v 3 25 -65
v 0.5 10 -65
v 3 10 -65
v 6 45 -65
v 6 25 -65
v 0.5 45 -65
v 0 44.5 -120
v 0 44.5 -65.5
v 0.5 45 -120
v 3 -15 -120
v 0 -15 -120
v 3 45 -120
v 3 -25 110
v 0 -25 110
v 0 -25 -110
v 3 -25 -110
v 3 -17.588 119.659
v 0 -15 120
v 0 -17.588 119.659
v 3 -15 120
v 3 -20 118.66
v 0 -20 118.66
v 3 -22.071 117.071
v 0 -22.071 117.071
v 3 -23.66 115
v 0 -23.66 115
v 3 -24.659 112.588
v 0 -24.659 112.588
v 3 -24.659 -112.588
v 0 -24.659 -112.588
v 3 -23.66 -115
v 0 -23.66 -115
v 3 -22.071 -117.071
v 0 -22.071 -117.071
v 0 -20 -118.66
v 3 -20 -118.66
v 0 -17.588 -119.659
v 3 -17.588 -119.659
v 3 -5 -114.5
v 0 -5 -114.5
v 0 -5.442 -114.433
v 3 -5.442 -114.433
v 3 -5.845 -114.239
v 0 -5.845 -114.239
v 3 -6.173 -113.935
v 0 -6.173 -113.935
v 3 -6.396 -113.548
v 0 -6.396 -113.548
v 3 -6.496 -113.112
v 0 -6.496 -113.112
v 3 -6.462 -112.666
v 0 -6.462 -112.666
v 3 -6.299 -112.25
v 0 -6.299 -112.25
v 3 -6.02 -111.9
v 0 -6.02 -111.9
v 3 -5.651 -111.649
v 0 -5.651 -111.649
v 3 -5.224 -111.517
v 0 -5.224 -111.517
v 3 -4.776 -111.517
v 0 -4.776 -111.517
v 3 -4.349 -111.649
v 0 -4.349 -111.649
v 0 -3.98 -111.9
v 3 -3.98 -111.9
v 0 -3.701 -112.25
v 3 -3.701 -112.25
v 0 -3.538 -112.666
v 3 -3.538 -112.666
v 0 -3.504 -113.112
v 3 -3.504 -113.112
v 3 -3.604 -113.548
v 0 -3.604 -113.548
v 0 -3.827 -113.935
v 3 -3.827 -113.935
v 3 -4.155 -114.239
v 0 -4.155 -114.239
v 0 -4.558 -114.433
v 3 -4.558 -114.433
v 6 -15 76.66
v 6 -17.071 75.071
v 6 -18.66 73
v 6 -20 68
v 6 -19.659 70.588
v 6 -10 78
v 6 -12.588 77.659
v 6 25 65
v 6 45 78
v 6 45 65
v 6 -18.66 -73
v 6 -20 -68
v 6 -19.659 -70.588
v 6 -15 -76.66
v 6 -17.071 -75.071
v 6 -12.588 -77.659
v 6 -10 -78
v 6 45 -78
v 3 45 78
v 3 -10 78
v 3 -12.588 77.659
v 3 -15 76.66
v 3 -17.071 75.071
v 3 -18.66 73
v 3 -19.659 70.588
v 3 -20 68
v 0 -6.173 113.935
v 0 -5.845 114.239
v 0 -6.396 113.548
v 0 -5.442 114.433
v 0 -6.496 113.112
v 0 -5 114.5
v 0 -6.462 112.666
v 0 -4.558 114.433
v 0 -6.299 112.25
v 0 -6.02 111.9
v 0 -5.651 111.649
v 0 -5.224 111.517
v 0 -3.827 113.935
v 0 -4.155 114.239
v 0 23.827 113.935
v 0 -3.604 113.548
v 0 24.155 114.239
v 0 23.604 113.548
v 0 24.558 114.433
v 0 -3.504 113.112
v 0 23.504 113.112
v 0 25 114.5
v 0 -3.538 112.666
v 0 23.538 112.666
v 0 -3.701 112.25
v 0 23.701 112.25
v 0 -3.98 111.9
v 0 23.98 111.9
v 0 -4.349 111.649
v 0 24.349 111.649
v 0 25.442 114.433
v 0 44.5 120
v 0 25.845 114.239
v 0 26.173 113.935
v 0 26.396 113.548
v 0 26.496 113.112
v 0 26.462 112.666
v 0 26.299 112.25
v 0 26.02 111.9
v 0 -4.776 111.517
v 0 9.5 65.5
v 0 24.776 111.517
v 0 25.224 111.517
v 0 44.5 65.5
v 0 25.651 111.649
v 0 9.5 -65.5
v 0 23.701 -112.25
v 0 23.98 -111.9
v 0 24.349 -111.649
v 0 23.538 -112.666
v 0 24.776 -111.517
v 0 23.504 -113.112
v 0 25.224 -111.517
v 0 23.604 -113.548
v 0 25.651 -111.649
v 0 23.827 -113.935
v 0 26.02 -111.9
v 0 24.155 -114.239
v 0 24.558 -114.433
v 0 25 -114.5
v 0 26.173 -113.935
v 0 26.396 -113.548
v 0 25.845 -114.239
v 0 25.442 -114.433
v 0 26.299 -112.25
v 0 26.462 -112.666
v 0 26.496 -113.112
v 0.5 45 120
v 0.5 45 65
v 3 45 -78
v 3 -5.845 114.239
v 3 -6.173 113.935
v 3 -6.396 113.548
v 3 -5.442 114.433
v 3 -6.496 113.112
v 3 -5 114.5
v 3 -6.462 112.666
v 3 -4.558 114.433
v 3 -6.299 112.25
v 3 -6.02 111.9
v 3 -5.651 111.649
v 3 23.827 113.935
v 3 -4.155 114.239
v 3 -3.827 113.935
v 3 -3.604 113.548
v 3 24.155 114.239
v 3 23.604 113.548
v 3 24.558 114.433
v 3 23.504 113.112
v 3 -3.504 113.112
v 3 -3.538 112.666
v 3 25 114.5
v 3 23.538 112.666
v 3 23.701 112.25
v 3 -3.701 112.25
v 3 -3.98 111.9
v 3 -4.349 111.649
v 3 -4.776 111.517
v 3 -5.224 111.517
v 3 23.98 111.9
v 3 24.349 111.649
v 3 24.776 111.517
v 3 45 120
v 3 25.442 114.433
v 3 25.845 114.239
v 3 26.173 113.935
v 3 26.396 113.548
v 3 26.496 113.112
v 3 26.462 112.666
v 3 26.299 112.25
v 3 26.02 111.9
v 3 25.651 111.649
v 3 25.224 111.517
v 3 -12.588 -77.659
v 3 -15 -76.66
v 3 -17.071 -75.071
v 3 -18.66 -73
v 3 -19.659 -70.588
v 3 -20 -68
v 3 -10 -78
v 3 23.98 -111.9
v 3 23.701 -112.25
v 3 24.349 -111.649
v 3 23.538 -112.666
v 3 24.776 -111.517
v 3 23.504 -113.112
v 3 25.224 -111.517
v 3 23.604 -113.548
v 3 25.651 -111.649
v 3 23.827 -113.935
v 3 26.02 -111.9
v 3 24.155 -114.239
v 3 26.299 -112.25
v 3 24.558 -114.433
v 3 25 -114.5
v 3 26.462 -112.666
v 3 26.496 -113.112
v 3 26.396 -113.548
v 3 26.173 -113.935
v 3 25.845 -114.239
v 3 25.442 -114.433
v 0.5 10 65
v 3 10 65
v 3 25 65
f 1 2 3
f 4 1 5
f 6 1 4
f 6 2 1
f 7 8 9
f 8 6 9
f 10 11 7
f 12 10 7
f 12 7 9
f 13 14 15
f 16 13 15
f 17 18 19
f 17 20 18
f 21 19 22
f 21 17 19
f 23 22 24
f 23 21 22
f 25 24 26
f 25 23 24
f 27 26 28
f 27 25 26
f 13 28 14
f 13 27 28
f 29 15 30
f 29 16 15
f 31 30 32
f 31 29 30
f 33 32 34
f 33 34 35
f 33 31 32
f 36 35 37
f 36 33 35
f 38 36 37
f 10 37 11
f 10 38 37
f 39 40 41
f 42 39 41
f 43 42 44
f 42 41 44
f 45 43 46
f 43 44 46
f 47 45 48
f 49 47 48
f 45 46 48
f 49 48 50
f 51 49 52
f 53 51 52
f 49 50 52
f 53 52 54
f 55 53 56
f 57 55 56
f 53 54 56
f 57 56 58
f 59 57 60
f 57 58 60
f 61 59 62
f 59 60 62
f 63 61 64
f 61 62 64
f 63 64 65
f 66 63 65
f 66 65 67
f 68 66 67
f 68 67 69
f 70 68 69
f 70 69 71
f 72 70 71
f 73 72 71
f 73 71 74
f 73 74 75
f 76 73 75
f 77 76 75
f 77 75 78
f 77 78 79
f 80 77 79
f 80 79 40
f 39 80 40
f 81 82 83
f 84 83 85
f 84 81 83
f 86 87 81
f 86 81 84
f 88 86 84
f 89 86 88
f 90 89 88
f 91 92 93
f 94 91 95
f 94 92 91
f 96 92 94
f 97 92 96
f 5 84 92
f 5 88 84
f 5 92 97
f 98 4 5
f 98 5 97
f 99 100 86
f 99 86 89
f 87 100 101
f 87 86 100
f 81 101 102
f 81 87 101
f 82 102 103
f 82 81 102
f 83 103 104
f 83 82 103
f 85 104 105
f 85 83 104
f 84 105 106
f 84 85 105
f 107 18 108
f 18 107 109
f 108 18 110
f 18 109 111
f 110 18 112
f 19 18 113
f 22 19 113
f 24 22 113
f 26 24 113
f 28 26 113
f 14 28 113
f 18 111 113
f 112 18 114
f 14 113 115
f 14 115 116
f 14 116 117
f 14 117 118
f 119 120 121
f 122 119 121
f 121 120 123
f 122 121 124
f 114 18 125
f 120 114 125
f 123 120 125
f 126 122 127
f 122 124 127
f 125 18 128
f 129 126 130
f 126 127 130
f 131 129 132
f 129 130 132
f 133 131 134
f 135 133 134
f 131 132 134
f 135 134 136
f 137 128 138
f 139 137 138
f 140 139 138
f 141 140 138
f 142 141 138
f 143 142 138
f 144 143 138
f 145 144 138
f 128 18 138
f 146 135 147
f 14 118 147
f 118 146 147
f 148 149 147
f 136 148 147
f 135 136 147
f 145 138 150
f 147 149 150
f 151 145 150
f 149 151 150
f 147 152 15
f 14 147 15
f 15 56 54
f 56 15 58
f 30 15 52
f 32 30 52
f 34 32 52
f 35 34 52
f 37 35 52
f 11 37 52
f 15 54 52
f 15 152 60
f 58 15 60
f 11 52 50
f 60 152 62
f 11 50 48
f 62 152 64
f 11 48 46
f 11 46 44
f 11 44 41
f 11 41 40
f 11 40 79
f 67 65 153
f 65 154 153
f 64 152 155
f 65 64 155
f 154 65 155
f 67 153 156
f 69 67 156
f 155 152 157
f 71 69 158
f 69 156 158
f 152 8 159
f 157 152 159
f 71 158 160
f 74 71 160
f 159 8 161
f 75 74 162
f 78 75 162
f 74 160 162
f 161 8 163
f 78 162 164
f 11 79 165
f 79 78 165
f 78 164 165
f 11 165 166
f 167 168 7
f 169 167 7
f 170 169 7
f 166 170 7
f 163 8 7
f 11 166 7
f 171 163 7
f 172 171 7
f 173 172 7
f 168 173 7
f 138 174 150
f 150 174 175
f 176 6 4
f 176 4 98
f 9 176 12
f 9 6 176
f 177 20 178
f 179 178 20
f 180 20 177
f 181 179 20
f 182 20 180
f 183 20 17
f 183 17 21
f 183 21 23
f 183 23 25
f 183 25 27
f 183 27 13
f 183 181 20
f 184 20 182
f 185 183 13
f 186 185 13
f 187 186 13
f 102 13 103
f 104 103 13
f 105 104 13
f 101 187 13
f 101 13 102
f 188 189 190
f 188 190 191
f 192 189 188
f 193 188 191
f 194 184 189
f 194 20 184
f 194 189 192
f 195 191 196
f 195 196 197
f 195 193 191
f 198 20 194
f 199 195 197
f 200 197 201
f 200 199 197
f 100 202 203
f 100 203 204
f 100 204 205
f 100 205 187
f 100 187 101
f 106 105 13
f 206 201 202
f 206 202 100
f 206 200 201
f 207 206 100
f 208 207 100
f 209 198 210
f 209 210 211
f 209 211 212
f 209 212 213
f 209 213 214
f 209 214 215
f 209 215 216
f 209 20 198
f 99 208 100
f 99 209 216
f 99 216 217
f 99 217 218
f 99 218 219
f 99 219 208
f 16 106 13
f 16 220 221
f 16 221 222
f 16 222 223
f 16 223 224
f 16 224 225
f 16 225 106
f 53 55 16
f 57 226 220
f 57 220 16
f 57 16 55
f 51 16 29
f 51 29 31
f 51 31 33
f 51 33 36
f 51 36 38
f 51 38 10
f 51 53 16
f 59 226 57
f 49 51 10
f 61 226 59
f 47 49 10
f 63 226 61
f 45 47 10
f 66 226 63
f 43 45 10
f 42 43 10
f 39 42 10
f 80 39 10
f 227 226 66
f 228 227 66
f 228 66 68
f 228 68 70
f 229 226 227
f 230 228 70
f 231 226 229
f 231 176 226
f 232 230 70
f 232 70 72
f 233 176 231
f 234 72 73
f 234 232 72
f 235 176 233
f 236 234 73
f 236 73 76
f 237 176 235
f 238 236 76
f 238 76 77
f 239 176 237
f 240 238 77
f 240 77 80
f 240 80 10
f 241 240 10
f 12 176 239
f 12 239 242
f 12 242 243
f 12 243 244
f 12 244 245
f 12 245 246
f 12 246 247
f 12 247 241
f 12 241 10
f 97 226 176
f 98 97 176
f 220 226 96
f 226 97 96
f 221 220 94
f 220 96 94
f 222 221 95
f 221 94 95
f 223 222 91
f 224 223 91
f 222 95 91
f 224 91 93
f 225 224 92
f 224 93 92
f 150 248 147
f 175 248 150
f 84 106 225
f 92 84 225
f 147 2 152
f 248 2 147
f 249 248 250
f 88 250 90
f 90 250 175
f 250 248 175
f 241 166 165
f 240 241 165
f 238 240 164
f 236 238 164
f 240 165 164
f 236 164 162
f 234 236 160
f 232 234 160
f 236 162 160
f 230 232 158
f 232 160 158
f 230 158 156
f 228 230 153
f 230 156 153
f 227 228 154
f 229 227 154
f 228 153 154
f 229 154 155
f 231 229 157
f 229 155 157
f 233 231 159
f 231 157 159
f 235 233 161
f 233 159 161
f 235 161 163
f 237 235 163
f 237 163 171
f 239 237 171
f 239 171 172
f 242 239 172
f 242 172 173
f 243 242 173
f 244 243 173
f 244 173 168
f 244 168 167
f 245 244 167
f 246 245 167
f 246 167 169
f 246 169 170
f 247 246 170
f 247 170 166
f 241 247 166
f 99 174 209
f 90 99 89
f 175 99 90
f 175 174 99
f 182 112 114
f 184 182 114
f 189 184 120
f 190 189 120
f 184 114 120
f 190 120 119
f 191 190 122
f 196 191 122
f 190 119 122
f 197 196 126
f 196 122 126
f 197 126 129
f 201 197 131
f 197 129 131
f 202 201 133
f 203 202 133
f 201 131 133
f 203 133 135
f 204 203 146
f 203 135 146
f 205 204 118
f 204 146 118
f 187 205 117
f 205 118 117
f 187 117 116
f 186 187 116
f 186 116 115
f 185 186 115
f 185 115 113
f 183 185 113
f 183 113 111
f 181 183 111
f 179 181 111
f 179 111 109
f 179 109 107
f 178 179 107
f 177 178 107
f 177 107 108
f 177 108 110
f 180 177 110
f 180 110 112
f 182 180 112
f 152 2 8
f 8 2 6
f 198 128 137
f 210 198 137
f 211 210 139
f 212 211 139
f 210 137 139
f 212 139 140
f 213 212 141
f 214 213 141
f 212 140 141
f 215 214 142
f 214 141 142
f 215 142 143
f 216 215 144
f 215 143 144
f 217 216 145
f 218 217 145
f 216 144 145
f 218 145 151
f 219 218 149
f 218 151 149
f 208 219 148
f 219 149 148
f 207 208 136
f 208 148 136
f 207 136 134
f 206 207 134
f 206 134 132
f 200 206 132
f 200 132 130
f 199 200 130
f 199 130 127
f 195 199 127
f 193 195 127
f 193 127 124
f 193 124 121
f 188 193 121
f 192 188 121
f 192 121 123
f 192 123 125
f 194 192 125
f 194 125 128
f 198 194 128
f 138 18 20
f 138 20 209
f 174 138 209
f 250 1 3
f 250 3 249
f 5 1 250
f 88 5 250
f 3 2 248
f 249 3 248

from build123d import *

# Parameters (mm, degrees)
SKETCH_1_W          = 240
SKETCH_1_H          = 70
EXTRUDE_1_DEPTH     = 3
SKETCH_4_W          = 156
SKETCH_4_H          = 65
EXTRUDE_3_DEPTH     = 3
SKETCH_5_R          = 1.5
CUT_EXTRUDE_1_DEPTH = 20
FILLET_1_R          = 10
FILLET_2_R          = 10
SKETCH_7_W          = 130
SKETCH_7_H          = 35
CUT_EXTRUDE_2_DEPTH = 3
SKETCH_8_W          = 130
SKETCH_8_H          = 20
CUT_EXTRUDE_3_DEPTH = 3
CHAMFER_1_SIZE      = 0.5
CHAMFER_2_SIZE      = 0.5


with BuildPart() as part:
    # 草图1 → 凸台-拉伸1 (new body)
    with BuildSketch(Plane(origin=(0, 0, 0), x_dir=(0, 0, -1), z_dir=(1, 0, 0))):
        with Locations((0, 10)):
            Rectangle(SKETCH_1_W, SKETCH_1_H)
    extrude(amount=EXTRUDE_1_DEPTH)

    # 草图4 → 凸台-拉伸3 (add)
    with BuildSketch(Plane(origin=(3, 0, 0), x_dir=(0, 0, -1), z_dir=(1, 0, 0))):
        with Locations((0, 12.5)):
            Rectangle(SKETCH_4_W, SKETCH_4_H)
    extrude(amount=EXTRUDE_3_DEPTH)

    # 草图5 → 切除-拉伸1 (cut)
    with BuildSketch(Plane.ZY):
        with Locations((113, 25)):
            Circle(SKETCH_5_R)
        with Locations((113, -5)):
            Circle(SKETCH_5_R)
        with Locations(Location((-113, -5, 0), (0, 0, 180))):
            Circle(SKETCH_5_R)
        with Locations(Location((-113, 25, 0), (0, 0, 180))):
            Circle(SKETCH_5_R)
    extrude(amount=-CUT_EXTRUDE_1_DEPTH, mode=Mode.SUBTRACT)

    # 圆角1
    fillet_1_edges = [part.edges().sort_by_distance(p)[0] for p in [
        (1.5, -25, -120),
        (1.5, -25, 120),
    ]]
    fillet(fillet_1_edges, radius=FILLET_1_R)

    # 圆角2
    fillet_2_edges = [part.edges().sort_by_distance(p)[0] for p in [
        (4.5, -20, 78),
        (4.5, -20, -78),
    ]]
    fillet(fillet_2_edges, radius=FILLET_2_R)

    # 草图7 → 切除-拉伸2 (cut)
    with BuildSketch(Plane.ZY):
        with Locations((0, 27.5)):
            Rectangle(SKETCH_7_W, SKETCH_7_H)
    extrude(amount=-CUT_EXTRUDE_2_DEPTH, mode=Mode.SUBTRACT)

    # 草图8 → 切除-拉伸3 (cut)
    with BuildSketch(Plane.ZY.offset(-3)):
        with Locations((0, 35)):
            Rectangle(SKETCH_8_W, SKETCH_8_H)
    extrude(amount=-CUT_EXTRUDE_3_DEPTH, mode=Mode.SUBTRACT)

    # 倒角1
    chamfer_1_edges = [part.edges().sort_by_distance(p)[0] for p in [
        (0, 45, -92.5),
        (0, 45, 92.5),
    ]]
    chamfer(chamfer_1_edges, length=CHAMFER_1_SIZE)

    # 倒角2
    chamfer_2_edges = [part.edges().sort_by_distance(p)[0] for p in [
        (0, 27.25, 65),
        (0, 10, 0),
        (0, 27.25, -65),
    ]]
    chamfer(chamfer_2_edges, length=CHAMFER_2_SIZE)


solid = part.part
